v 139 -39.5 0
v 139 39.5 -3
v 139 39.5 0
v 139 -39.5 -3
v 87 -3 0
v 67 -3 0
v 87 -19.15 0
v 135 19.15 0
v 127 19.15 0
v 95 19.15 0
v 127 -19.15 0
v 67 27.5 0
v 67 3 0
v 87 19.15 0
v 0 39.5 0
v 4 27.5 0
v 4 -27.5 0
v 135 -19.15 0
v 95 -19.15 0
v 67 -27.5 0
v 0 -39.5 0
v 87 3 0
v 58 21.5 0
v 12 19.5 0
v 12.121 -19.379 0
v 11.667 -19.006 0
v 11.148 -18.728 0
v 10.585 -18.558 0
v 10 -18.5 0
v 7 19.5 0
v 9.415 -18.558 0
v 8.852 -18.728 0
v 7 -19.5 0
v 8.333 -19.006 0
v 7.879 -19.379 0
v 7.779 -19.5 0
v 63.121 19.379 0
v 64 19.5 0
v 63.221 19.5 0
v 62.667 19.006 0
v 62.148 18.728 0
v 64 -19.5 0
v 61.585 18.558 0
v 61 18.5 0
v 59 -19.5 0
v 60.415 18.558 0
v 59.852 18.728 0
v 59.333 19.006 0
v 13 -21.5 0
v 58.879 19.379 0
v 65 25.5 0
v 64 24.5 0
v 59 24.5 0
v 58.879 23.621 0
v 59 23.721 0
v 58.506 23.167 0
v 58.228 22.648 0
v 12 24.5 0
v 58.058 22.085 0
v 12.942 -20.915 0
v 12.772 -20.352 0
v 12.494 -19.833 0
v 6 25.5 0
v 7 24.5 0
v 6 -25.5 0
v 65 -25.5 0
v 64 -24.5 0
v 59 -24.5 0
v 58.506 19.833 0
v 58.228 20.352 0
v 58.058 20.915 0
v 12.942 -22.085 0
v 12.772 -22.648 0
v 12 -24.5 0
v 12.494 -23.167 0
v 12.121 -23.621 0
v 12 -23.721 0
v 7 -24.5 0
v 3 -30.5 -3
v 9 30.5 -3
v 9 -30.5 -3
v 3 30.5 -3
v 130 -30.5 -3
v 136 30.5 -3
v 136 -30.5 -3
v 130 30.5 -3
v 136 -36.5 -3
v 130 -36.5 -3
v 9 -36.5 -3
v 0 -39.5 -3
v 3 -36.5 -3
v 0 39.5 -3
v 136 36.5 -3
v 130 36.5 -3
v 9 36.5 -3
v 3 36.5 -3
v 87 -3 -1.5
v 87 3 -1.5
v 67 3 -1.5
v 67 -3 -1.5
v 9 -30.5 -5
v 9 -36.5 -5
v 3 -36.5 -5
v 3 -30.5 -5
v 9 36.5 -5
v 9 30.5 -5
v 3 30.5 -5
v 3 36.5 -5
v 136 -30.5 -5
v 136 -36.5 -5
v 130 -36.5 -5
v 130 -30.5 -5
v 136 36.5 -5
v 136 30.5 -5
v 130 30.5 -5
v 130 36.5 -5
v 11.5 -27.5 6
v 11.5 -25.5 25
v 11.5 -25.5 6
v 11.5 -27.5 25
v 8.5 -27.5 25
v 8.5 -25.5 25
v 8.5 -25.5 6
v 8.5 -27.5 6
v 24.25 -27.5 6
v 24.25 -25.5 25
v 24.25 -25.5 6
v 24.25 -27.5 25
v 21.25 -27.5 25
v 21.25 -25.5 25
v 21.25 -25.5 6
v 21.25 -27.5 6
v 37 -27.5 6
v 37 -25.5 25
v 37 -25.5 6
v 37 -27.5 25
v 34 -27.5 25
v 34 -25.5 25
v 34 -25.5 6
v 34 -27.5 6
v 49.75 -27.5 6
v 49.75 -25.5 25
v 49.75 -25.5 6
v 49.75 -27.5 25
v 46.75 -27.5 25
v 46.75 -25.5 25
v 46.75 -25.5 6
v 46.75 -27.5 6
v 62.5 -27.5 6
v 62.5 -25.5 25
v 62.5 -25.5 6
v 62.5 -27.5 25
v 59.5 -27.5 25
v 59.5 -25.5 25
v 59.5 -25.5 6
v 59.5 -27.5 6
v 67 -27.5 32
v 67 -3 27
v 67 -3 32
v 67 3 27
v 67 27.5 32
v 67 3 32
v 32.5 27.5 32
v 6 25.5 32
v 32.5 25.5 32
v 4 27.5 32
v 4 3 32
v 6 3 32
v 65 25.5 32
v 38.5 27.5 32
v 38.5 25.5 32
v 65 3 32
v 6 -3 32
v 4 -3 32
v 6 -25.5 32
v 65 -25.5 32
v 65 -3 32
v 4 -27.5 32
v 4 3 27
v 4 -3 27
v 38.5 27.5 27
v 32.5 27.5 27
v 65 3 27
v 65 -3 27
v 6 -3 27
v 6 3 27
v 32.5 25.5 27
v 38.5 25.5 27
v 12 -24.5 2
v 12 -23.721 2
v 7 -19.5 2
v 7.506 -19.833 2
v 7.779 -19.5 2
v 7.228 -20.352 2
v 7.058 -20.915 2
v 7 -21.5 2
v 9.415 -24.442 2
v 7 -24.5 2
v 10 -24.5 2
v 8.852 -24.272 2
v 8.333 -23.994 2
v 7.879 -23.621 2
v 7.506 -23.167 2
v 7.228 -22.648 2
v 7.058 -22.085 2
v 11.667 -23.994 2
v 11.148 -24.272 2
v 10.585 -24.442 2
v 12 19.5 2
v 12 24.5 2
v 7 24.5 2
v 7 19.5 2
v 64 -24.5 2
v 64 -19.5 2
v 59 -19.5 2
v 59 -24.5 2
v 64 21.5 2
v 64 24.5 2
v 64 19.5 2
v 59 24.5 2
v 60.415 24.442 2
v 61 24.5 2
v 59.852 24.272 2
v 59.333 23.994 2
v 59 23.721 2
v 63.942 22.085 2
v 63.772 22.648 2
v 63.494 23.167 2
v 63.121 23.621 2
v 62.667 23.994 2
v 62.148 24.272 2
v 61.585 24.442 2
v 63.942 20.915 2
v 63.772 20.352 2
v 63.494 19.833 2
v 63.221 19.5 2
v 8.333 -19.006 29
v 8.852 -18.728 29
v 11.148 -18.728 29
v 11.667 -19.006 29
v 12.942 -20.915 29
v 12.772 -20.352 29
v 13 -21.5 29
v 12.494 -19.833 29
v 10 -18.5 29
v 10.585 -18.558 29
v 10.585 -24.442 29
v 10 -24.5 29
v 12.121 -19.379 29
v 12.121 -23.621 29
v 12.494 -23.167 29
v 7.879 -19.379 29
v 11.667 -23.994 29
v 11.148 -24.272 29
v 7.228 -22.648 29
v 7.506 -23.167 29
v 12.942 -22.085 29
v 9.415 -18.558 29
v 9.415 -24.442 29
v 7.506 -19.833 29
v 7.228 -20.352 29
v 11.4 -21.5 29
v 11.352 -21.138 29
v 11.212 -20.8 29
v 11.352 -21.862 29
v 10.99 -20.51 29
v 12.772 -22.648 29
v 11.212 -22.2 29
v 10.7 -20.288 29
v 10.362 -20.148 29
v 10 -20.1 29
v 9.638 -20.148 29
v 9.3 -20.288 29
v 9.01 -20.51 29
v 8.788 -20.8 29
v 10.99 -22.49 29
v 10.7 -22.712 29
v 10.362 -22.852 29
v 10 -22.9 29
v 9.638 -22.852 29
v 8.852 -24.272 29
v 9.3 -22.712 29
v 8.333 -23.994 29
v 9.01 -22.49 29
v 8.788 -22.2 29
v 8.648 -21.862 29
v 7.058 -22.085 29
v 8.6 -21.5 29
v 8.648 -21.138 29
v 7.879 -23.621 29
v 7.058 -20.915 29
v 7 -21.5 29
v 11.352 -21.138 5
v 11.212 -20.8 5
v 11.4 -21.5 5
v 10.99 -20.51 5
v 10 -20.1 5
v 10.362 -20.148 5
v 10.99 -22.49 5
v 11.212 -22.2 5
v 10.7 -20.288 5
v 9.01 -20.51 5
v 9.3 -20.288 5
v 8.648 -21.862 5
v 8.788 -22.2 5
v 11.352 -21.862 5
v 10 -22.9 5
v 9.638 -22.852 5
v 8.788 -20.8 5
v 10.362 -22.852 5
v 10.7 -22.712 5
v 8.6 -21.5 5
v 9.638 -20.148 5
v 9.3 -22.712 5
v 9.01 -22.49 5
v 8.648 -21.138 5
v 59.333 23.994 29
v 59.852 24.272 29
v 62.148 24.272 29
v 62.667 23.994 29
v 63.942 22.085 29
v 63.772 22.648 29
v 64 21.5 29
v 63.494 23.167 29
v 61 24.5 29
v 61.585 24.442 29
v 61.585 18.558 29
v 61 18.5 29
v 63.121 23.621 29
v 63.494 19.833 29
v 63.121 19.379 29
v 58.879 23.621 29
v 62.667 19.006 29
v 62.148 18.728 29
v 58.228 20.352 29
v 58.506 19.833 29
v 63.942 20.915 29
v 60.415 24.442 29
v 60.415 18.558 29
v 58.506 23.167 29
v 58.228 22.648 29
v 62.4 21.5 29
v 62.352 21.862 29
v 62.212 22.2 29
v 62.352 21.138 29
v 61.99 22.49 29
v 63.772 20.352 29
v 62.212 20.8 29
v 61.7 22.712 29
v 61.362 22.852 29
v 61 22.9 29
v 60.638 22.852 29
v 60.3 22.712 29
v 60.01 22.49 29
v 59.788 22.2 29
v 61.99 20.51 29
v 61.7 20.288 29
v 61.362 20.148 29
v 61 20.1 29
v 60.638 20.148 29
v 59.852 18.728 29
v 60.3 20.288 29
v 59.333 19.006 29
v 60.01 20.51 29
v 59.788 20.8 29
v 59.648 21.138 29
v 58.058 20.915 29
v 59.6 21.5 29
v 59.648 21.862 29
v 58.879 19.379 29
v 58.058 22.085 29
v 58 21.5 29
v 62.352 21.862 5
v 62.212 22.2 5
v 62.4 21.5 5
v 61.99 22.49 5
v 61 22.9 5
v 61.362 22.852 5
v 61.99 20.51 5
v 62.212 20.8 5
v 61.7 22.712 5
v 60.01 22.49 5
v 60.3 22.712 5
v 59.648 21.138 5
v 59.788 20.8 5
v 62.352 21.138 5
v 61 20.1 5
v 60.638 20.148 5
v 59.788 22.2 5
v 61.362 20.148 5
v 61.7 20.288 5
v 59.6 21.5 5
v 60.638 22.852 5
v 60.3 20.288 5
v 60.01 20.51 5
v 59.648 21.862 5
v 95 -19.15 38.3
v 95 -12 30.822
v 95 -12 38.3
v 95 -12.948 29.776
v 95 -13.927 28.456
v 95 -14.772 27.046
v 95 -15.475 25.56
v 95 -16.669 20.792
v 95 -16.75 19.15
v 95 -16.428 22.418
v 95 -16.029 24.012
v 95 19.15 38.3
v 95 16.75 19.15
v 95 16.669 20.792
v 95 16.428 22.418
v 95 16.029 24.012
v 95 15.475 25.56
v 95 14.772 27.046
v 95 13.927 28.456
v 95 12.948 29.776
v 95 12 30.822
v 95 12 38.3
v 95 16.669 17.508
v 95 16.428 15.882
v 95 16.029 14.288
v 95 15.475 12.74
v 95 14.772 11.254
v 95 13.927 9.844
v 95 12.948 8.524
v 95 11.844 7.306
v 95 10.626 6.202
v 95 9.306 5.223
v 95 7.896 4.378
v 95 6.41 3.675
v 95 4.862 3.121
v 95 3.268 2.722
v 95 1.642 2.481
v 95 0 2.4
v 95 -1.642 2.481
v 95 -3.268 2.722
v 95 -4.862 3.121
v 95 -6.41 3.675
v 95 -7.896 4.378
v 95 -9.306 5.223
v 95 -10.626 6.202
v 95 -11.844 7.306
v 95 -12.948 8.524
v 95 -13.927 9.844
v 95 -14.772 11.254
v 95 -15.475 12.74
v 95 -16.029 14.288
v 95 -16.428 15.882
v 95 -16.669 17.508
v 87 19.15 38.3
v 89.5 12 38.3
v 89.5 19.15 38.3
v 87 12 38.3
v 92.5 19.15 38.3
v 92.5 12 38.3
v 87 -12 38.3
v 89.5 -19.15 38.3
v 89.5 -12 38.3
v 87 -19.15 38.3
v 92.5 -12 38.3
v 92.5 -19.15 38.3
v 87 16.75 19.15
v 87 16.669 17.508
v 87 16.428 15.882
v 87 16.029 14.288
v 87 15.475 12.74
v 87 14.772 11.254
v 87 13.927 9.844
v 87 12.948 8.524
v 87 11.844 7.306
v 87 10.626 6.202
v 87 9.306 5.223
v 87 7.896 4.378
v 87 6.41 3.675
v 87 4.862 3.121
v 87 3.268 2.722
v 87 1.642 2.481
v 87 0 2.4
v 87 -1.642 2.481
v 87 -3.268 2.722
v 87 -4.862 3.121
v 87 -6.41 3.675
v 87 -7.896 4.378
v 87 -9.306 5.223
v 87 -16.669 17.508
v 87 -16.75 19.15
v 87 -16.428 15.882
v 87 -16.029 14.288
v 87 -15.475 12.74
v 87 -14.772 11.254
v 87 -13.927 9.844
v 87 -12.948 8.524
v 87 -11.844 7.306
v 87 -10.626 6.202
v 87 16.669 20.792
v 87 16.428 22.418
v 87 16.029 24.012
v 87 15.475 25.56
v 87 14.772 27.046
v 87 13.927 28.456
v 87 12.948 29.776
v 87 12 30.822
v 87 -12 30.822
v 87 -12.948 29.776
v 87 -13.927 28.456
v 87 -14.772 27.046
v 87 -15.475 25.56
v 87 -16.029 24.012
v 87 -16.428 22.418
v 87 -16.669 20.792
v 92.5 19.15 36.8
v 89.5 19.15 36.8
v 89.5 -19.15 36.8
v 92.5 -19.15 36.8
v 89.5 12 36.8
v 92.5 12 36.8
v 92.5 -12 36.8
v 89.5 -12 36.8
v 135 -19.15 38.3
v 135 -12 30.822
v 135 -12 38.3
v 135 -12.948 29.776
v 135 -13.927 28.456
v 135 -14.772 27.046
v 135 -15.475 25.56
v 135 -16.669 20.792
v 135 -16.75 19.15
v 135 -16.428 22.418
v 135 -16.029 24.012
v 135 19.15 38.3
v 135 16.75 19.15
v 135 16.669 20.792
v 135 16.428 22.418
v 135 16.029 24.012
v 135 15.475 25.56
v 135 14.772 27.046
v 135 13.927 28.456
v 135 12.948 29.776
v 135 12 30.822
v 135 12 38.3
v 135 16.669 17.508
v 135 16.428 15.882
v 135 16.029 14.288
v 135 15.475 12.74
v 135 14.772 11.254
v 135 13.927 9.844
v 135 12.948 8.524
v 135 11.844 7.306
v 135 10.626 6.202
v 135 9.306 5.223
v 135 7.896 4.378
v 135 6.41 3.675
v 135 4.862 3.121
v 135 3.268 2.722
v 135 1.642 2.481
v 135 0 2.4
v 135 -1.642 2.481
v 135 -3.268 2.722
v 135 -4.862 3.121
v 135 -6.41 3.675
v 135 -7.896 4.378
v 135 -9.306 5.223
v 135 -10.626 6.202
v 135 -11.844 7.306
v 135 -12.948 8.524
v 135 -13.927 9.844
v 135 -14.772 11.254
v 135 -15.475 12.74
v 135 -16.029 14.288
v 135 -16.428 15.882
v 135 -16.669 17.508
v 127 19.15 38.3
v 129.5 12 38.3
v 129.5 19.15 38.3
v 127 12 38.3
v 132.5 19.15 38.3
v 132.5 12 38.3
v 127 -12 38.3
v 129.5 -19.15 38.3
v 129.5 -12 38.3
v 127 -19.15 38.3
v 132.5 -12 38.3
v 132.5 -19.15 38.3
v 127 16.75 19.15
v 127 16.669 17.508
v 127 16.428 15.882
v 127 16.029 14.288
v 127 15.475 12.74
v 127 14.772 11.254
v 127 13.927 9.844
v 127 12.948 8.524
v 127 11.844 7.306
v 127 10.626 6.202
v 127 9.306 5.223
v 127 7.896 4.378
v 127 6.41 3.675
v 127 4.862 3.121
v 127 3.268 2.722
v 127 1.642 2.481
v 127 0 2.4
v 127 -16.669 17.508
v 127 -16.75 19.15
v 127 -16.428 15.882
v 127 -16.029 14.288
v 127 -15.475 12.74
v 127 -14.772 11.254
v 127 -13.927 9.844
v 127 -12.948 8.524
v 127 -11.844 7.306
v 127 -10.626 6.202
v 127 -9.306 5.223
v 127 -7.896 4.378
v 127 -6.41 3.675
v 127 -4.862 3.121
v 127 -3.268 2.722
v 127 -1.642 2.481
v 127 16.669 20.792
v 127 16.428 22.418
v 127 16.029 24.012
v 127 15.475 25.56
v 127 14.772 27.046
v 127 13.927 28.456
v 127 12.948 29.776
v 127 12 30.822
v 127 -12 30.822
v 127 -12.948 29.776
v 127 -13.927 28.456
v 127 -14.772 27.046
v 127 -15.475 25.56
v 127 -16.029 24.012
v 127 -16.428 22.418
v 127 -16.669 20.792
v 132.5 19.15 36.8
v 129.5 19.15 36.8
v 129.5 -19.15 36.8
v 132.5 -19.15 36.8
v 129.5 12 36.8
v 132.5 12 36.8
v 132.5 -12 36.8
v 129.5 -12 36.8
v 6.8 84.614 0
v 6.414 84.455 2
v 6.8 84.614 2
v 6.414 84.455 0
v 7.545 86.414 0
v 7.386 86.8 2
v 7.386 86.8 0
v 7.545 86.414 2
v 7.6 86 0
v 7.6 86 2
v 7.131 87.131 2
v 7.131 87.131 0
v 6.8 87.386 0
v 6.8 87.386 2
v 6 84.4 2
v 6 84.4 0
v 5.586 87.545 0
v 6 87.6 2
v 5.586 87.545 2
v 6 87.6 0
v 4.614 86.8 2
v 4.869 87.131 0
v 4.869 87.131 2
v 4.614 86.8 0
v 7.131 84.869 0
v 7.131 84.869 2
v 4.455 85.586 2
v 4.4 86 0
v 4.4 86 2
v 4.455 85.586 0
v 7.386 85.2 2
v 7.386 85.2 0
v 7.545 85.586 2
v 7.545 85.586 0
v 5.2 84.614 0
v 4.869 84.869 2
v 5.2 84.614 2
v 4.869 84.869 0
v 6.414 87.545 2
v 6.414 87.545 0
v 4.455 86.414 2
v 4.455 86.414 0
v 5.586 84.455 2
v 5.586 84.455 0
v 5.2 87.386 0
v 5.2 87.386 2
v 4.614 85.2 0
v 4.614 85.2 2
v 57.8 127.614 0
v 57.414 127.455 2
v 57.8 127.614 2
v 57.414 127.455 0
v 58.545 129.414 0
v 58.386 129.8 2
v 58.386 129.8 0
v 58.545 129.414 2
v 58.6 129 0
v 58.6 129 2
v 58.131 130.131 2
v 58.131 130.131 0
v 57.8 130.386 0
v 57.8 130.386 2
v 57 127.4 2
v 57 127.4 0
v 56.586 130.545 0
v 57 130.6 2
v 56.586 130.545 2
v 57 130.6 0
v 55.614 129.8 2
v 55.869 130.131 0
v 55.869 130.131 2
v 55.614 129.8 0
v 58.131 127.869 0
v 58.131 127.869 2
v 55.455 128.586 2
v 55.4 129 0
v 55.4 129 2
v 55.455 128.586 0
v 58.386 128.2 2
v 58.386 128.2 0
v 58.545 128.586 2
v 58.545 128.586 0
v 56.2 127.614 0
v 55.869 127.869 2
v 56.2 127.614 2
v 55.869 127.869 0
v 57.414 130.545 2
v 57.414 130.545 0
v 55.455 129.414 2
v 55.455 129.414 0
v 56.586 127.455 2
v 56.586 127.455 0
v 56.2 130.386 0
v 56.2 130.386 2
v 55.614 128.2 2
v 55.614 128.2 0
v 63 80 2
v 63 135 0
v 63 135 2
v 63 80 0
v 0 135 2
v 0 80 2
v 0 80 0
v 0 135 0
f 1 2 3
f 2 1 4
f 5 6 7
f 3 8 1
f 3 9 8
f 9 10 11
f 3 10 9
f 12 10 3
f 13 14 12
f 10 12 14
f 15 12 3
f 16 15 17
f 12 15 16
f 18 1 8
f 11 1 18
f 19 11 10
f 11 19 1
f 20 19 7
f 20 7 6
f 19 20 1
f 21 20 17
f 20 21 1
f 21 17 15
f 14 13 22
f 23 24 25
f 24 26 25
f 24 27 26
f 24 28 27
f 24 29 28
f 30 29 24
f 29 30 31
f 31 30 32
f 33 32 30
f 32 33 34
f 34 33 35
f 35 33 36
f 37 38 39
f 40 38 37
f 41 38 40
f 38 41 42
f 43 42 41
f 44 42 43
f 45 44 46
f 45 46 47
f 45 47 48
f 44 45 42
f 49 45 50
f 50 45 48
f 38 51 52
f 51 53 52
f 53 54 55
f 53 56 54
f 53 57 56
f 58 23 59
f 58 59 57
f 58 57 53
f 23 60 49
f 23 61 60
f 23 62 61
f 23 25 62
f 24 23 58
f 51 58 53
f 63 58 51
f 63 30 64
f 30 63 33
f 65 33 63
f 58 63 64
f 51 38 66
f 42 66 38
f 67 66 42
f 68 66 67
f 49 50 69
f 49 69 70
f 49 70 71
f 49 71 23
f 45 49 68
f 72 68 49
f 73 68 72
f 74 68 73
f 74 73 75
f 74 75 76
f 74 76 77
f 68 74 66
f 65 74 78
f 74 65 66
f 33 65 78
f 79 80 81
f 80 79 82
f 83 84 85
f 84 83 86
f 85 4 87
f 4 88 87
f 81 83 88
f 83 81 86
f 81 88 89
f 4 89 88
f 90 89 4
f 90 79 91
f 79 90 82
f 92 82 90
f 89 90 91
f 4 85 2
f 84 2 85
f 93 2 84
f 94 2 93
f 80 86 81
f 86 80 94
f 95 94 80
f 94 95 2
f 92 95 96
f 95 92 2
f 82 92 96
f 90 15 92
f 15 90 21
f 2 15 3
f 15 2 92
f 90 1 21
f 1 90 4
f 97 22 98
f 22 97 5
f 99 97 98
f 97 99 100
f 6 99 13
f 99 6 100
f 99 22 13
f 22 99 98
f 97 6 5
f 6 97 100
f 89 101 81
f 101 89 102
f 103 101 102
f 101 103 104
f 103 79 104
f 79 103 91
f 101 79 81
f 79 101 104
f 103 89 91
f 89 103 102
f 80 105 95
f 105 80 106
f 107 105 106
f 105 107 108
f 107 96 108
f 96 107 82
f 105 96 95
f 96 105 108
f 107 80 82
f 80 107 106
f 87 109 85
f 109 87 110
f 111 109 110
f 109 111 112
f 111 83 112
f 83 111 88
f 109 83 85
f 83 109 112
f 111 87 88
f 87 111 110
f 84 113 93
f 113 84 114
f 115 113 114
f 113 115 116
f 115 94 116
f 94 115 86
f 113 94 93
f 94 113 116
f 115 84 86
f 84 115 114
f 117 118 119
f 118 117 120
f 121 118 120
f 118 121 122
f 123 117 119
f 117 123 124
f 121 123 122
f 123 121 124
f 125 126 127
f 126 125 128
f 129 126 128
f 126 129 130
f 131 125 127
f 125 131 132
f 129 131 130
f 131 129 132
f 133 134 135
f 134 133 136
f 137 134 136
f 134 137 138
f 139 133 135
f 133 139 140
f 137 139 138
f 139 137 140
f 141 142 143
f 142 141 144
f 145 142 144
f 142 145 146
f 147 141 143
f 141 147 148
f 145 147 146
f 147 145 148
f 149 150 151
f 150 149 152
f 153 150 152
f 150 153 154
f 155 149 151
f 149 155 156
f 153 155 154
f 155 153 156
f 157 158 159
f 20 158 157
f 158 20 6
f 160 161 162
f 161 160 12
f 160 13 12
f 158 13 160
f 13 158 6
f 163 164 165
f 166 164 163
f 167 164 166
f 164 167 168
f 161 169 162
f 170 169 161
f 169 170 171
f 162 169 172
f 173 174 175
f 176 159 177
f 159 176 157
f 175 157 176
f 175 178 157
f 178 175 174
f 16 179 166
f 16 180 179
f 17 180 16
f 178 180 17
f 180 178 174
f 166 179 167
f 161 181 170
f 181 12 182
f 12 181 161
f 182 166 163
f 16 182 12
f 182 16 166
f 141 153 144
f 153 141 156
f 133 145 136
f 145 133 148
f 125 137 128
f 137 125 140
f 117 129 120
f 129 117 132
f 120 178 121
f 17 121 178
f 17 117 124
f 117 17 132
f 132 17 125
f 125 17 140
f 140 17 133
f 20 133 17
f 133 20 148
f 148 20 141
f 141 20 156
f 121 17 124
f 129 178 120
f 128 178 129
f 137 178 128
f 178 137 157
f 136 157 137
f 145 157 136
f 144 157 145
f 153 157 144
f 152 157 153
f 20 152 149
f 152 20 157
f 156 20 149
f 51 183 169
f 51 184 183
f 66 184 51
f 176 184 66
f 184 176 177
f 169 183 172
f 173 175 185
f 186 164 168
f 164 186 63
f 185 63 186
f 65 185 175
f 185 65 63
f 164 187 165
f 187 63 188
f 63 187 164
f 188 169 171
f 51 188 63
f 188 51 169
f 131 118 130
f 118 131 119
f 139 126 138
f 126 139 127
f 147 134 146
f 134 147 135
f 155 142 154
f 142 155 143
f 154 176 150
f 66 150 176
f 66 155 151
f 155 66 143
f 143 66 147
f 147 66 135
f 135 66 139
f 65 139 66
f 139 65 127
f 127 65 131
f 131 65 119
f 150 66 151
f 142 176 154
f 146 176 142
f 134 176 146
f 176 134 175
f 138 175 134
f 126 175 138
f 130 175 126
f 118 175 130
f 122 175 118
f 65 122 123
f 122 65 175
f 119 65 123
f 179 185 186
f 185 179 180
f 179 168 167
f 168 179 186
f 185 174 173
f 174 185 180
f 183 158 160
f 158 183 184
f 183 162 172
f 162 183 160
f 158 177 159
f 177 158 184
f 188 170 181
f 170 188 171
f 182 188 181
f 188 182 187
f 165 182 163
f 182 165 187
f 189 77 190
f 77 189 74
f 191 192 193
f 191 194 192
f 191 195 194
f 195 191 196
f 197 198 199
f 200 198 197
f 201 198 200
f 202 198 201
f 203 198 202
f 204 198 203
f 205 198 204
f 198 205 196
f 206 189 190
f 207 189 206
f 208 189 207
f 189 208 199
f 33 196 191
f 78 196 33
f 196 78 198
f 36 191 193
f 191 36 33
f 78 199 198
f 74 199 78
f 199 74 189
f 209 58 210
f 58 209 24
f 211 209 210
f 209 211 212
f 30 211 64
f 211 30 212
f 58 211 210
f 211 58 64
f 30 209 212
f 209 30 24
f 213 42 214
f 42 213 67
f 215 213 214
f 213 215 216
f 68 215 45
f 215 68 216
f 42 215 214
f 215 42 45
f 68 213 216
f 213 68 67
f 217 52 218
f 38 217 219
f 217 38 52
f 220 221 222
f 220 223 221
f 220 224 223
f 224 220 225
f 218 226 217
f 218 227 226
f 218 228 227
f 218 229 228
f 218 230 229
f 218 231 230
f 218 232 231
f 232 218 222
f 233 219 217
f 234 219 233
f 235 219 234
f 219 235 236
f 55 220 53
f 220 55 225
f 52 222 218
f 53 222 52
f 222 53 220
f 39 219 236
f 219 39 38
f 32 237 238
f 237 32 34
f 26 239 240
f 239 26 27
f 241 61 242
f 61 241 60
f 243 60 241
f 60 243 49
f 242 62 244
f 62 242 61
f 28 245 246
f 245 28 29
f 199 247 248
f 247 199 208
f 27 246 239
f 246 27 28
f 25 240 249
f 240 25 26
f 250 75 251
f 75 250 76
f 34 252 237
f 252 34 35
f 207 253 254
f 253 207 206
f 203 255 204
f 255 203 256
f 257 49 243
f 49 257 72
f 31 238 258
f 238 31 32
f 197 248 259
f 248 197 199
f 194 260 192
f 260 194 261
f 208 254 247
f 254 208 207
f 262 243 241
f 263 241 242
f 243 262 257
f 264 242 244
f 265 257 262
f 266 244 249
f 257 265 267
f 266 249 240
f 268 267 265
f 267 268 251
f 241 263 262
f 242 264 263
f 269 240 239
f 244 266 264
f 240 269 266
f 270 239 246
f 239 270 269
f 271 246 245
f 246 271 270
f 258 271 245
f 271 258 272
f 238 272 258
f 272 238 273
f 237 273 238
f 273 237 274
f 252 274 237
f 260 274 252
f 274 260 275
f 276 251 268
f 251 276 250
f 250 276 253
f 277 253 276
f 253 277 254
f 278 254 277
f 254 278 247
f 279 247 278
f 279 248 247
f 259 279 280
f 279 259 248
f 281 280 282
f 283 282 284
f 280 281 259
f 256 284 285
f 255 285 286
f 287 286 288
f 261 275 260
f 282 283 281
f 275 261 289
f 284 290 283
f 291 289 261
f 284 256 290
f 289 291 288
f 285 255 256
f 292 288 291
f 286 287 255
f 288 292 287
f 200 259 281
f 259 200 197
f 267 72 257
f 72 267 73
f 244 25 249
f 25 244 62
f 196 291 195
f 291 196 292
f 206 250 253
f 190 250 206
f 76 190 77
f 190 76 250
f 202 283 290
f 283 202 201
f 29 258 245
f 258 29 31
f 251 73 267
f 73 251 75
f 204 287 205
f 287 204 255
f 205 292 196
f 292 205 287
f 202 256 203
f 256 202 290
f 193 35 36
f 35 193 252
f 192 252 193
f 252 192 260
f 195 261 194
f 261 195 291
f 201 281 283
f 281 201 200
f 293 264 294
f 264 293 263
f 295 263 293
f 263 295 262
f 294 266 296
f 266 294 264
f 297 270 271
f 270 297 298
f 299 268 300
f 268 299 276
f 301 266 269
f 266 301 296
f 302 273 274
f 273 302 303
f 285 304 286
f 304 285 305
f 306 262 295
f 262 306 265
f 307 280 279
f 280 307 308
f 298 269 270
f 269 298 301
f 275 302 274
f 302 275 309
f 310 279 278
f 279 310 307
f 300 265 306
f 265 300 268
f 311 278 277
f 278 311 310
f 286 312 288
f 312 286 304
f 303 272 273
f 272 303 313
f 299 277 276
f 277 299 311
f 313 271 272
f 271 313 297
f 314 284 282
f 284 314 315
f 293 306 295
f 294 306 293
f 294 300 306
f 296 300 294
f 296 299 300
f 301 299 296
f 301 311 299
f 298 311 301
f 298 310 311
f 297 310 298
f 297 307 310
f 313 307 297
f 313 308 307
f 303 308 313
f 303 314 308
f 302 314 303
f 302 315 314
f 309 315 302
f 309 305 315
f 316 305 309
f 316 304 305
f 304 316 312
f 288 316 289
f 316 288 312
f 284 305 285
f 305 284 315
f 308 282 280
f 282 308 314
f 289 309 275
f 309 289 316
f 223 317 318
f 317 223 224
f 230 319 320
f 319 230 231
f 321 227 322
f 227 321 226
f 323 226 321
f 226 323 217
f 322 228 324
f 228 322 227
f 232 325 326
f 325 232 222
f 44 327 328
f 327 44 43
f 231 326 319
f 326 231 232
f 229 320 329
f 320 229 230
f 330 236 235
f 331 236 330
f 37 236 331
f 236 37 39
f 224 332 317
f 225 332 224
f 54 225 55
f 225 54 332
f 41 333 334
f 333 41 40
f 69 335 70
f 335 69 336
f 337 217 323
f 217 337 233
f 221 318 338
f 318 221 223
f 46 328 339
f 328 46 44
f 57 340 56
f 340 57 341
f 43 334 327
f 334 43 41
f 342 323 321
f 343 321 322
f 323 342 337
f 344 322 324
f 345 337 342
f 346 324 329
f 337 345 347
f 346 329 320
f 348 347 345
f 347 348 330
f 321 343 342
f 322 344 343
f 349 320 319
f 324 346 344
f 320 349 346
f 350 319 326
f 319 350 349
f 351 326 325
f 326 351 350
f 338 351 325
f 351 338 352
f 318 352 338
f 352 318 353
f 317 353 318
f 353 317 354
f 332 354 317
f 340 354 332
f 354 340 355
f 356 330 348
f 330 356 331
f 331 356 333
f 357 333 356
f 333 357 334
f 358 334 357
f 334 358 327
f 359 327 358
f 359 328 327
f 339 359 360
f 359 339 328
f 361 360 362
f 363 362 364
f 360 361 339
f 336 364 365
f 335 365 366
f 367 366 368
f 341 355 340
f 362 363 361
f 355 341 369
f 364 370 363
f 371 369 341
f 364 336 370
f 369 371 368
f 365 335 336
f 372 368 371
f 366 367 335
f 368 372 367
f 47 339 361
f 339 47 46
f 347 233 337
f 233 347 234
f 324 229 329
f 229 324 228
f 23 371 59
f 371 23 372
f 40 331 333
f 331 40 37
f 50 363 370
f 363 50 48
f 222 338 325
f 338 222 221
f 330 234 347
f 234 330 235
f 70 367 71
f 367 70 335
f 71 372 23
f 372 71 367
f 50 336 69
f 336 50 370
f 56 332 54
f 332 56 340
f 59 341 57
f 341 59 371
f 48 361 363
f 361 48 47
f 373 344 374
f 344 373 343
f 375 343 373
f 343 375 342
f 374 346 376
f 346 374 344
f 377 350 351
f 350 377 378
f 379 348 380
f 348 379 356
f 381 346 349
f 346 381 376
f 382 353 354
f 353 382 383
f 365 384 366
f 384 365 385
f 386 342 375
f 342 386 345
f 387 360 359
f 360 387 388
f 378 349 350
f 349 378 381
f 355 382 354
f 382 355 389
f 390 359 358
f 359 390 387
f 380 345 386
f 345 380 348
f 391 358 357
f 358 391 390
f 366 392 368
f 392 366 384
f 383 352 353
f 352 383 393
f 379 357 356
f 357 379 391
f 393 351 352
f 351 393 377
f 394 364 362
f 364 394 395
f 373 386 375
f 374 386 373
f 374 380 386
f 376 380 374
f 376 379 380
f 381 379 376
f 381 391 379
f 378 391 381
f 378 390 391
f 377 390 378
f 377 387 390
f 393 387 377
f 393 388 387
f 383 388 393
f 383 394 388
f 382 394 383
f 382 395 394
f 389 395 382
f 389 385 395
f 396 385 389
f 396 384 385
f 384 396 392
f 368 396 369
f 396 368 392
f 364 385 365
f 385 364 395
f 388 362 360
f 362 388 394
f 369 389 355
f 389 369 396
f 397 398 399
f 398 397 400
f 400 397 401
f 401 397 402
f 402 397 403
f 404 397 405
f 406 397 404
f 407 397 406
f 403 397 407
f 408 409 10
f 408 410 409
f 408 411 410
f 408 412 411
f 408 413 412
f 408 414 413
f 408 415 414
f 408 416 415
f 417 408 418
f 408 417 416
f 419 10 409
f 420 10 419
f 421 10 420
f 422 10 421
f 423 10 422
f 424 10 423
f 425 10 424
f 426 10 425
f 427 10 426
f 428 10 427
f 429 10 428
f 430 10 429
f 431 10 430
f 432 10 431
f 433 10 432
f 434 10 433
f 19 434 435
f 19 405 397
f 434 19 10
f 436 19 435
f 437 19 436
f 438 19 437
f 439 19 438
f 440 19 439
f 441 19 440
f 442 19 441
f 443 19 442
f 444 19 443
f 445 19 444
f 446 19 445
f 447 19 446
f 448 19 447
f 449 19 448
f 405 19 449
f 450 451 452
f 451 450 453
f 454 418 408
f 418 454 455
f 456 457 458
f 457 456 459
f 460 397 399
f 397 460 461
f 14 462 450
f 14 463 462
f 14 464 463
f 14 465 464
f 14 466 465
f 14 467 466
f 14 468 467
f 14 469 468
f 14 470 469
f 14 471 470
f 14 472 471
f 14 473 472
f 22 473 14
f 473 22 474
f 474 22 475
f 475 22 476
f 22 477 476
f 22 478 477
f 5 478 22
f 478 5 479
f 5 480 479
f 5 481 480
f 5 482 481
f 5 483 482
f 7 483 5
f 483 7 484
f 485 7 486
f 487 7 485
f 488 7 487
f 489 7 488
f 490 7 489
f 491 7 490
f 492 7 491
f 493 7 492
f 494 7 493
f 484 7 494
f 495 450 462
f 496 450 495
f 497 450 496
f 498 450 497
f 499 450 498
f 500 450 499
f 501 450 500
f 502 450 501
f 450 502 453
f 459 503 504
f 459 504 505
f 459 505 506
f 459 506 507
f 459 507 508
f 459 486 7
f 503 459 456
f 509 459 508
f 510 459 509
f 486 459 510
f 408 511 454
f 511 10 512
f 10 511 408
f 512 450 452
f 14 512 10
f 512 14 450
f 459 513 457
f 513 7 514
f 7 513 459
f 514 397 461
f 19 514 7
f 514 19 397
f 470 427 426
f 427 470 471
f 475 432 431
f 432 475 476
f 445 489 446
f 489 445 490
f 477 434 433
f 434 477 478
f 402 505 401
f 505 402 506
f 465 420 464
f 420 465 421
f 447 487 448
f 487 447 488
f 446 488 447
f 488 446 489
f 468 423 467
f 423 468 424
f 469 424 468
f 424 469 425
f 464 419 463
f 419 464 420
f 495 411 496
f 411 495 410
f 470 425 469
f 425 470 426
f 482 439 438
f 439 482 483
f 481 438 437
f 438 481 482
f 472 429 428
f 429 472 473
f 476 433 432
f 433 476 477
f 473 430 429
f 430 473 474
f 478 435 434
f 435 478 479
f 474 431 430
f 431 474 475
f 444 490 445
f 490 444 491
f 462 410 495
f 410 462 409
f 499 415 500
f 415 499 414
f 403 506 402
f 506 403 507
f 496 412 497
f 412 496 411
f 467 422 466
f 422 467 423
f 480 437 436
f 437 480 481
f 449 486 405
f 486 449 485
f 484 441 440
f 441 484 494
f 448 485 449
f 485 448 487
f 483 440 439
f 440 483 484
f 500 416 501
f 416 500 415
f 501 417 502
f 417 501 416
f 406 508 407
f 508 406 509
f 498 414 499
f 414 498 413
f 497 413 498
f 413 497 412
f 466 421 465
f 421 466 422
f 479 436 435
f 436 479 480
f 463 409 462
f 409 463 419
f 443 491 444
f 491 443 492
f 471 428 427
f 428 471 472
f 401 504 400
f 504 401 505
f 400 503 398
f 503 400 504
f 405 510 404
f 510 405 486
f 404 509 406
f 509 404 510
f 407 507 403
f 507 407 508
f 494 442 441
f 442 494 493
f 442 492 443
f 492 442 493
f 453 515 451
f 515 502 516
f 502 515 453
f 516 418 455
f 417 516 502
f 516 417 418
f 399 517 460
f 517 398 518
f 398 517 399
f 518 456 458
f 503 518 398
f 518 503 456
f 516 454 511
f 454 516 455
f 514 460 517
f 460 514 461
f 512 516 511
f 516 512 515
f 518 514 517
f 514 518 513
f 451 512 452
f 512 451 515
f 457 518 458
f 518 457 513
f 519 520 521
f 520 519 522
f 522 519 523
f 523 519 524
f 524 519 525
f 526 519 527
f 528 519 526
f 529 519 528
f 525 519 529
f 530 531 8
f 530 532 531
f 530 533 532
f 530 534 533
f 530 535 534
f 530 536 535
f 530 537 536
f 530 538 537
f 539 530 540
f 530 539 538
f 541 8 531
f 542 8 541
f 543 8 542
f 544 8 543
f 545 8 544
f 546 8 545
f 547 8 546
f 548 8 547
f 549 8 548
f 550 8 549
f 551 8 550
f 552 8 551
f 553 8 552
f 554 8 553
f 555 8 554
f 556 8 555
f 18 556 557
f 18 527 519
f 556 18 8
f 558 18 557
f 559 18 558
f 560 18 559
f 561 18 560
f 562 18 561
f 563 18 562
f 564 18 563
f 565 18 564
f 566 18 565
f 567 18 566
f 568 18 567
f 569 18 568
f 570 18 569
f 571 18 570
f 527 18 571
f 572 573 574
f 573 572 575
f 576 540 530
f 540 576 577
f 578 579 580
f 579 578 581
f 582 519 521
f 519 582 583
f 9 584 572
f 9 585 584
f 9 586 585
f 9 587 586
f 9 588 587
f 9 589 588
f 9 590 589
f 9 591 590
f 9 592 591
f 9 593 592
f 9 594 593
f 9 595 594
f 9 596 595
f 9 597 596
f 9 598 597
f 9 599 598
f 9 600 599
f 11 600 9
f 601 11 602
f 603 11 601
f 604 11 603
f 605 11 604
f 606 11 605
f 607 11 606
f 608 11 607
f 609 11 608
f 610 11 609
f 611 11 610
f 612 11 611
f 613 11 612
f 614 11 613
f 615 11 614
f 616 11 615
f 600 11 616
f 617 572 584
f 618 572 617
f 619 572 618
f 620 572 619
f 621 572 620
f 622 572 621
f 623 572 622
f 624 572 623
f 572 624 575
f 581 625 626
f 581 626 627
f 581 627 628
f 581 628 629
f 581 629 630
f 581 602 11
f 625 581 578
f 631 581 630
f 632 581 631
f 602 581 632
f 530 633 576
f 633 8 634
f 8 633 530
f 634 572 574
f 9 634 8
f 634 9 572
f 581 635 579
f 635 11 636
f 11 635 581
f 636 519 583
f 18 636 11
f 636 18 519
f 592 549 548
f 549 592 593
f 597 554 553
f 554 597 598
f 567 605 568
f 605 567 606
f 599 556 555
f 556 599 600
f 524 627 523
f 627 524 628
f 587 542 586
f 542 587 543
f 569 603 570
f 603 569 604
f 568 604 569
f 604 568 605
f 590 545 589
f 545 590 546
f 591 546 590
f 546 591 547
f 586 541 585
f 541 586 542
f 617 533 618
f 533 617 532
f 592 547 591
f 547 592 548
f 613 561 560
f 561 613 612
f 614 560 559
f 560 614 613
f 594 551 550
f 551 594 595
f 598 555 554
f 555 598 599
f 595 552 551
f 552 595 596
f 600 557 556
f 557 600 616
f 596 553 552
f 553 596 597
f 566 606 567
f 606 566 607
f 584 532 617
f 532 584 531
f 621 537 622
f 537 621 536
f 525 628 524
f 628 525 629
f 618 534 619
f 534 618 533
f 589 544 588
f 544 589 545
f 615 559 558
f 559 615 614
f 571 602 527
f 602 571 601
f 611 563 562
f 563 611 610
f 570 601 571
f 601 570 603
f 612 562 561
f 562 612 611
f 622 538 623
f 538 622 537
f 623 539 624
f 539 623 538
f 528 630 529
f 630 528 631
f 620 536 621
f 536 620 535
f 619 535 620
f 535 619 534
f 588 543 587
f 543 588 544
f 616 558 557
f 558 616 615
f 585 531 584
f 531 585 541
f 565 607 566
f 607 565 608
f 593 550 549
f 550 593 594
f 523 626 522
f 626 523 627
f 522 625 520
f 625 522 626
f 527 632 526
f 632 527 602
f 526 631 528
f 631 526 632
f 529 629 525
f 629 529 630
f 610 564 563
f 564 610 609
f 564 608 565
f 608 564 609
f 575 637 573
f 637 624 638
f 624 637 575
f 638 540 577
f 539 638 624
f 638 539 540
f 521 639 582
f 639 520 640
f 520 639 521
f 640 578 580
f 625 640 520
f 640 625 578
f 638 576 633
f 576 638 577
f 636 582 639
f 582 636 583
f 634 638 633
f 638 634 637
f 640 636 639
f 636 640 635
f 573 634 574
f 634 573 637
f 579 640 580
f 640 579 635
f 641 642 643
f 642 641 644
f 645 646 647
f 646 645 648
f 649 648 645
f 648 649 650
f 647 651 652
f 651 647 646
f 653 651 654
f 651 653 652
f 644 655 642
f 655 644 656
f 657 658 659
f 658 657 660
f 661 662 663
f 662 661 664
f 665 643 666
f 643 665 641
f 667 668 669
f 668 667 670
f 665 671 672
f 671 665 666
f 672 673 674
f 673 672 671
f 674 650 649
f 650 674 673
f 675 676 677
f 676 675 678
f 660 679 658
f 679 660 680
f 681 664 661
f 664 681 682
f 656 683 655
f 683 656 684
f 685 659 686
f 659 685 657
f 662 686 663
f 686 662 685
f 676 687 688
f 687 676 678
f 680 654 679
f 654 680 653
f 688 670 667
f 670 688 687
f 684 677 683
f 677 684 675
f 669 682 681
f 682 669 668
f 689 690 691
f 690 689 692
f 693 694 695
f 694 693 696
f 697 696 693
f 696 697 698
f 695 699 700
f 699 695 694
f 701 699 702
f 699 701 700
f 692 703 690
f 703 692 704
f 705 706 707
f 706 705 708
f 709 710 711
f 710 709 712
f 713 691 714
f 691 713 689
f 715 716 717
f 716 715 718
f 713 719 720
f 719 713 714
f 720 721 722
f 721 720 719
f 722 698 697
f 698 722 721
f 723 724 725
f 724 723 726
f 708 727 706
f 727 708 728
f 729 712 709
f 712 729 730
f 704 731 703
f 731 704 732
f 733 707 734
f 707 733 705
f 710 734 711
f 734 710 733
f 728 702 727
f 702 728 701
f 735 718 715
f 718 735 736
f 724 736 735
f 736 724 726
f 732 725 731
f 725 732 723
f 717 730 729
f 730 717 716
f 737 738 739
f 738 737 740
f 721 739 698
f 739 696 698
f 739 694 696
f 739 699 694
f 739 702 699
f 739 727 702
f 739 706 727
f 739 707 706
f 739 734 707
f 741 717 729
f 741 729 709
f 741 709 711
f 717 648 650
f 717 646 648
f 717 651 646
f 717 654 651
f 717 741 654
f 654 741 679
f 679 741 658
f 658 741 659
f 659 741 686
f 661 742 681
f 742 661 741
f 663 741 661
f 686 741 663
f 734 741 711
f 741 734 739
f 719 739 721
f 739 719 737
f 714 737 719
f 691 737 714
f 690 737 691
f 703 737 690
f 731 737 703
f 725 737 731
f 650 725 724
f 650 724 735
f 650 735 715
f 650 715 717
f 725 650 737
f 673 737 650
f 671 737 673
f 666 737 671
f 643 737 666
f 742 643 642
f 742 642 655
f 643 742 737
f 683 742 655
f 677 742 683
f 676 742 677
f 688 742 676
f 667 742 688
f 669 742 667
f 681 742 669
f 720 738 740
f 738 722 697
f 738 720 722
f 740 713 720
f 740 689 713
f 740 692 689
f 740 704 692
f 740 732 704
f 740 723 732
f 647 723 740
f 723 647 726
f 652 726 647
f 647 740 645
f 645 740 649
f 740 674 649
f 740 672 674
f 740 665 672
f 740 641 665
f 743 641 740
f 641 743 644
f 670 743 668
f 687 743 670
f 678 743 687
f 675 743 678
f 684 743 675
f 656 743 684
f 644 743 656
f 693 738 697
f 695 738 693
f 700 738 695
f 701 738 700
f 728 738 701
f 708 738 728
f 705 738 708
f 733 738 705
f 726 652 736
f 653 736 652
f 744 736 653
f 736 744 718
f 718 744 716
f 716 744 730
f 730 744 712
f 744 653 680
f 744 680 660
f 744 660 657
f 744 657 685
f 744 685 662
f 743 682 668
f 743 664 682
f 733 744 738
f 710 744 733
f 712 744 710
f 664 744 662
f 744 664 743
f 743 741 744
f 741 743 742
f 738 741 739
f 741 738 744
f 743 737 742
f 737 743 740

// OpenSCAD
// ============================================================================
// pump_station_001.scad — Trạm bơm gọn: đế liền + hộp che L298N + yên kẹp RS365
// ----------------------------------------------------------------------------
// Nguồn: docs/superpowers/specs/2026-07-24-pump-station-mount-design.md
// Kiến trúc: 1 tấm đế (baseplate) mang liền 2 cụm — hộp L298N (hở nắp, nắp rời
// pump_station_lid()) và 2 yên kẹp ôm thân trụ bơm RS365 — nối bằng 1 rãnh dây
// nông trên mặt đế. pump_rs365() (accessories_001.scad) KHÔNG đổi, vẫn chỉ là
// mô hình hiển thị bơm mua sẵn (không in); phần in MỚI ở file này là đế + hộp +
// yên kẹp.
//
// Trục dài đế = X. Hộp L298N ở đầu −X (gần), 2 yên kẹp ở đầu +X (xa) — lỗ khoan
// yên kẹp nằm NGANG dọc trục X, khớp hướng trục bơm (giống cách pump_rs365()
// dựng cylinder dọc X qua rotate([0,90,0])).
//
// Yên kẹp: khối vuông + lỗ khoan ngang Ø pump_clamp_id + khe hẹp từ đỉnh khối
// xuống tâm lỗ (rộng pump_clamp_slot_w < Ø lỗ) để lồng bơm từ TRÊN xuống, PETG
// hơi dẻo ép giữ. Tâm lỗ đặt tại pump_clamp_od/2 (đối xứng trên/dưới khối) để
// thành dưới lỗ luôn dày đúng pump_clamp_t bất kể số đo pump_bbox — ưu tiên AN
// TOÀN KẾT CẤU hơn là khớp pixel với model placeholder pump_rs365() (lệch cao độ
// vài mm so placeholder chỉ là sai khác hiển thị, không ảnh hưởng mount thật).
// ============================================================================
include <../constants.scad>

EPS = 0.05;

// ---------------------------------------------------------------- Hộp L298N (hở nắp — đáy = mặt đế bên dưới)
module l298n_box_walls() {
    difference() {
        cube([l298n_box_od_l, l298n_box_od_w, l298n_box_h]);
        // Khoét lòng hộp (chừa 4 thành; không chừa sàn — sàn = mặt đế)
        translate([l298n_box_wall, l298n_box_wall, -EPS])
            cube([l298n_box_id_l, l298n_box_id_w, l298n_box_h + 2*EPS]);
        // Khe dây INPUT 12V — cạnh −X (hướng ra ngoài trạm, xa bơm)
        translate([-EPS, l298n_box_od_w/2 - wire_notch_w/2, l298n_box_h - wire_notch_h])
            cube([l298n_box_wall + 2*EPS, wire_notch_w, wire_notch_h + EPS]);
        // Khe dây OUTPUT động cơ — cạnh +X (hướng về phía yên kẹp bơm)
        translate([l298n_box_od_l - l298n_box_wall - EPS, l298n_box_od_w/2 - wire_notch_w/2,
                   l298n_box_h - wire_notch_h])
            cube([l298n_box_wall + 2*EPS, wire_notch_w, wire_notch_h + EPS]);
        // Khe dây LOGIC (IN1/IN2/EN + GND lên ESP32) — cạnh +Y (về khối quang chính)
        translate([l298n_box_od_l/2 - wire_notch_w/2, l298n_box_od_w - l298n_box_wall - EPS,
                   l298n_box_h - wire_notch_h])
            cube([wire_notch_w, l298n_box_wall + 2*EPS, wire_notch_h + EPS]);
        // Khe thoát khí — cạnh −Y (đối diện khe logic, phía tản nhiệt board)
        for (i = [0 : l298n_vent_n - 1])
            translate([l298n_box_wall + 4 + i * (l298n_box_id_l - 8) / (l298n_vent_n - 1) - l298n_vent_w/2,
                       -EPS, 6])
                cube([l298n_vent_w, l298n_box_wall + 2*EPS, l298n_box_h - 6 - wire_notch_h - 2]);
    }
    // 4 gờ đỡ góc board (board tựa lên — KHÔNG cần khớp lỗ vít board thật)
    foot_sz = 5.0;
    for (cx = [l298n_box_wall + 1, l298n_box_od_l - l298n_box_wall - 1 - foot_sz])
        for (cy = [l298n_box_wall + 1, l298n_box_od_w - l298n_box_wall - 1 - foot_sz])
            translate([cx, cy, 0])
                cube([foot_sz, foot_sz, l298n_foot_h]);
    // 2 gờ vít M3 tự-ren giữ nắp, 2 góc chéo
    boss_d = 6.0;
    for (p = [[l298n_box_wall + boss_d/2 + 1, l298n_box_wall + boss_d/2 + 1],
              [l298n_box_od_l - l298n_box_wall - boss_d/2 - 1,
               l298n_box_od_w - l298n_box_wall - boss_d/2 - 1]])
        translate([p[0], p[1], 0])
            difference() {
                cylinder(d = boss_d, h = l298n_box_h - 3, $fn = 32);
                // Lỗ tự-ren hở TỪ ĐỈNH gờ (vít xuyên nắp từ trên xuống bắt vào đây);
                // chừa 5mm đặc ở ĐÁY gờ (giáp mặt đế) để không thông xuống đế.
                // (SỬA so bản gốc trong brief: bản gốc đặt lỗ hở ở ĐÁY [z=-EPS] và
                // đặc ở ĐỈNH [z=24..29] — ngược hướng, vít từ trên không vào được lỗ.)
                translate([0, 0, 5])
                    cylinder(d = l298n_lid_screw_d, h = l298n_box_h - 3 - 5 + EPS, $fn = 24);
            }
}

// Nắp hộp L298N — chi tiết in RIÊNG (print_pump_station_lid.scad)
module pump_station_lid() {
    boss_d = 6.0;
    difference() {
        cube([l298n_box_od_l, l298n_box_od_w, l298n_lid_t]);
        for (p = [[l298n_box_wall + boss_d/2 + 1, l298n_box_wall + boss_d/2 + 1],
                  [l298n_box_od_l - l298n_box_wall - boss_d/2 - 1,
                   l298n_box_od_w - l298n_box_wall - boss_d/2 - 1]])
            translate([p[0], p[1], -EPS])
                cylinder(d = l298n_lid_clr_d, h = l298n_lid_t + 2*EPS, $fn = 24);
    }
}

// ---------------------------------------------------------------- Yên kẹp bơm: khối + lỗ khoan ngang + khe lồng từ trên
module pump_clamp_post() {
    block_h  = pump_clamp_od;
    center_z = pump_clamp_od / 2;
    difference() {
        translate([0, -pump_clamp_od/2, 0])
            cube([pump_clamp_w, pump_clamp_od, block_h]);
        // Lỗ khoan ngang (trục X = trục bơm) giữ thân trụ động cơ
        translate([-EPS, 0, center_z])
            rotate([0, 90, 0])
                cylinder(d = pump_clamp_id, h = pump_clamp_w + 2*EPS, $fn = 64);
        // Khe lồng từ ĐỈNH khối xuống tâm lỗ (hẹp hơn Ø lỗ — PETG dẻo ép giữ bơm)
        translate([-EPS, -pump_clamp_slot_w/2, center_z])
            cube([pump_clamp_w + 2*EPS, pump_clamp_slot_w, block_h - center_z + EPS]);
        // Rãnh zip-tie trên đỉnh khối, cắt ngang qua khe lồng (bù sai số Ø bơm thật)
        translate([pump_clamp_w/2 - pump_clamp_strap_w/2, -pump_clamp_od/2 - EPS, block_h - 1.5])
            cube([pump_clamp_strap_w, pump_clamp_od + 2*EPS, 1.5 + EPS]);
    }
}

// ---------------------------------------------------------------- Rãnh dây nối hộp L298N ↔ yên kẹp bơm (khoét vào mặt đế)
module wire_channel(length) {
    ch_w = 6.0; ch_d = 1.5;
    translate([0, -ch_w/2, -ch_d])
        cube([length, ch_w, ch_d + EPS]);
}

// ---------------------------------------------------------------- Trạm bơm hoàn chỉnh (đế + hộp L298N không nắp + 2 yên kẹp)
// Gốc cục bộ: góc −X/−Y của đế tại z=0 (mặt TRÊN đế); đế dày pump_station_base_t
// nằm ở z ÂM (−pump_station_base_t .. 0).
module pump_station() {
    box_x    = pump_station_margin;
    clamp_x0 = box_x + l298n_box_od_l + pump_station_gap;
    clamp_x1 = clamp_x0 + pump_clamp_gap;
    base_y   = pump_station_wid / 2;
    chan_len = clamp_x0 - (box_x + l298n_box_od_l);

    // Đế (khoét rãnh dây trên mặt)
    difference() {
        translate([0, -base_y, -pump_station_base_t])
            cube([pump_station_len, pump_station_wid, pump_station_base_t]);
        translate([box_x + l298n_box_od_l, 0, 0])
            wire_channel(chan_len);
    }
    // 4 chân đế góc
    foot_sz = 6.0;
    for (fx = [3, pump_station_len - 3 - foot_sz])
        for (fy = [-base_y + 3, base_y - 3 - foot_sz])
            translate([fx, fy, -pump_station_base_t - pump_station_foot_h])
                cube([foot_sz, foot_sz, pump_station_foot_h]);
    // Hộp L298N (căn giữa theo bề rộng đế)
    translate([box_x, -l298n_box_od_w/2, 0]) l298n_box_walls();
    // 2 yên kẹp bơm (căn giữa theo bề rộng đế; lỗ khoan nằm ngang trục X)
    translate([clamp_x0, 0, 0]) pump_clamp_post();
    translate([clamp_x1, 0, 0]) pump_clamp_post();
}

// Xem lẻ
pump_station();
translate([0, 80, 0]) pump_station_lid();
